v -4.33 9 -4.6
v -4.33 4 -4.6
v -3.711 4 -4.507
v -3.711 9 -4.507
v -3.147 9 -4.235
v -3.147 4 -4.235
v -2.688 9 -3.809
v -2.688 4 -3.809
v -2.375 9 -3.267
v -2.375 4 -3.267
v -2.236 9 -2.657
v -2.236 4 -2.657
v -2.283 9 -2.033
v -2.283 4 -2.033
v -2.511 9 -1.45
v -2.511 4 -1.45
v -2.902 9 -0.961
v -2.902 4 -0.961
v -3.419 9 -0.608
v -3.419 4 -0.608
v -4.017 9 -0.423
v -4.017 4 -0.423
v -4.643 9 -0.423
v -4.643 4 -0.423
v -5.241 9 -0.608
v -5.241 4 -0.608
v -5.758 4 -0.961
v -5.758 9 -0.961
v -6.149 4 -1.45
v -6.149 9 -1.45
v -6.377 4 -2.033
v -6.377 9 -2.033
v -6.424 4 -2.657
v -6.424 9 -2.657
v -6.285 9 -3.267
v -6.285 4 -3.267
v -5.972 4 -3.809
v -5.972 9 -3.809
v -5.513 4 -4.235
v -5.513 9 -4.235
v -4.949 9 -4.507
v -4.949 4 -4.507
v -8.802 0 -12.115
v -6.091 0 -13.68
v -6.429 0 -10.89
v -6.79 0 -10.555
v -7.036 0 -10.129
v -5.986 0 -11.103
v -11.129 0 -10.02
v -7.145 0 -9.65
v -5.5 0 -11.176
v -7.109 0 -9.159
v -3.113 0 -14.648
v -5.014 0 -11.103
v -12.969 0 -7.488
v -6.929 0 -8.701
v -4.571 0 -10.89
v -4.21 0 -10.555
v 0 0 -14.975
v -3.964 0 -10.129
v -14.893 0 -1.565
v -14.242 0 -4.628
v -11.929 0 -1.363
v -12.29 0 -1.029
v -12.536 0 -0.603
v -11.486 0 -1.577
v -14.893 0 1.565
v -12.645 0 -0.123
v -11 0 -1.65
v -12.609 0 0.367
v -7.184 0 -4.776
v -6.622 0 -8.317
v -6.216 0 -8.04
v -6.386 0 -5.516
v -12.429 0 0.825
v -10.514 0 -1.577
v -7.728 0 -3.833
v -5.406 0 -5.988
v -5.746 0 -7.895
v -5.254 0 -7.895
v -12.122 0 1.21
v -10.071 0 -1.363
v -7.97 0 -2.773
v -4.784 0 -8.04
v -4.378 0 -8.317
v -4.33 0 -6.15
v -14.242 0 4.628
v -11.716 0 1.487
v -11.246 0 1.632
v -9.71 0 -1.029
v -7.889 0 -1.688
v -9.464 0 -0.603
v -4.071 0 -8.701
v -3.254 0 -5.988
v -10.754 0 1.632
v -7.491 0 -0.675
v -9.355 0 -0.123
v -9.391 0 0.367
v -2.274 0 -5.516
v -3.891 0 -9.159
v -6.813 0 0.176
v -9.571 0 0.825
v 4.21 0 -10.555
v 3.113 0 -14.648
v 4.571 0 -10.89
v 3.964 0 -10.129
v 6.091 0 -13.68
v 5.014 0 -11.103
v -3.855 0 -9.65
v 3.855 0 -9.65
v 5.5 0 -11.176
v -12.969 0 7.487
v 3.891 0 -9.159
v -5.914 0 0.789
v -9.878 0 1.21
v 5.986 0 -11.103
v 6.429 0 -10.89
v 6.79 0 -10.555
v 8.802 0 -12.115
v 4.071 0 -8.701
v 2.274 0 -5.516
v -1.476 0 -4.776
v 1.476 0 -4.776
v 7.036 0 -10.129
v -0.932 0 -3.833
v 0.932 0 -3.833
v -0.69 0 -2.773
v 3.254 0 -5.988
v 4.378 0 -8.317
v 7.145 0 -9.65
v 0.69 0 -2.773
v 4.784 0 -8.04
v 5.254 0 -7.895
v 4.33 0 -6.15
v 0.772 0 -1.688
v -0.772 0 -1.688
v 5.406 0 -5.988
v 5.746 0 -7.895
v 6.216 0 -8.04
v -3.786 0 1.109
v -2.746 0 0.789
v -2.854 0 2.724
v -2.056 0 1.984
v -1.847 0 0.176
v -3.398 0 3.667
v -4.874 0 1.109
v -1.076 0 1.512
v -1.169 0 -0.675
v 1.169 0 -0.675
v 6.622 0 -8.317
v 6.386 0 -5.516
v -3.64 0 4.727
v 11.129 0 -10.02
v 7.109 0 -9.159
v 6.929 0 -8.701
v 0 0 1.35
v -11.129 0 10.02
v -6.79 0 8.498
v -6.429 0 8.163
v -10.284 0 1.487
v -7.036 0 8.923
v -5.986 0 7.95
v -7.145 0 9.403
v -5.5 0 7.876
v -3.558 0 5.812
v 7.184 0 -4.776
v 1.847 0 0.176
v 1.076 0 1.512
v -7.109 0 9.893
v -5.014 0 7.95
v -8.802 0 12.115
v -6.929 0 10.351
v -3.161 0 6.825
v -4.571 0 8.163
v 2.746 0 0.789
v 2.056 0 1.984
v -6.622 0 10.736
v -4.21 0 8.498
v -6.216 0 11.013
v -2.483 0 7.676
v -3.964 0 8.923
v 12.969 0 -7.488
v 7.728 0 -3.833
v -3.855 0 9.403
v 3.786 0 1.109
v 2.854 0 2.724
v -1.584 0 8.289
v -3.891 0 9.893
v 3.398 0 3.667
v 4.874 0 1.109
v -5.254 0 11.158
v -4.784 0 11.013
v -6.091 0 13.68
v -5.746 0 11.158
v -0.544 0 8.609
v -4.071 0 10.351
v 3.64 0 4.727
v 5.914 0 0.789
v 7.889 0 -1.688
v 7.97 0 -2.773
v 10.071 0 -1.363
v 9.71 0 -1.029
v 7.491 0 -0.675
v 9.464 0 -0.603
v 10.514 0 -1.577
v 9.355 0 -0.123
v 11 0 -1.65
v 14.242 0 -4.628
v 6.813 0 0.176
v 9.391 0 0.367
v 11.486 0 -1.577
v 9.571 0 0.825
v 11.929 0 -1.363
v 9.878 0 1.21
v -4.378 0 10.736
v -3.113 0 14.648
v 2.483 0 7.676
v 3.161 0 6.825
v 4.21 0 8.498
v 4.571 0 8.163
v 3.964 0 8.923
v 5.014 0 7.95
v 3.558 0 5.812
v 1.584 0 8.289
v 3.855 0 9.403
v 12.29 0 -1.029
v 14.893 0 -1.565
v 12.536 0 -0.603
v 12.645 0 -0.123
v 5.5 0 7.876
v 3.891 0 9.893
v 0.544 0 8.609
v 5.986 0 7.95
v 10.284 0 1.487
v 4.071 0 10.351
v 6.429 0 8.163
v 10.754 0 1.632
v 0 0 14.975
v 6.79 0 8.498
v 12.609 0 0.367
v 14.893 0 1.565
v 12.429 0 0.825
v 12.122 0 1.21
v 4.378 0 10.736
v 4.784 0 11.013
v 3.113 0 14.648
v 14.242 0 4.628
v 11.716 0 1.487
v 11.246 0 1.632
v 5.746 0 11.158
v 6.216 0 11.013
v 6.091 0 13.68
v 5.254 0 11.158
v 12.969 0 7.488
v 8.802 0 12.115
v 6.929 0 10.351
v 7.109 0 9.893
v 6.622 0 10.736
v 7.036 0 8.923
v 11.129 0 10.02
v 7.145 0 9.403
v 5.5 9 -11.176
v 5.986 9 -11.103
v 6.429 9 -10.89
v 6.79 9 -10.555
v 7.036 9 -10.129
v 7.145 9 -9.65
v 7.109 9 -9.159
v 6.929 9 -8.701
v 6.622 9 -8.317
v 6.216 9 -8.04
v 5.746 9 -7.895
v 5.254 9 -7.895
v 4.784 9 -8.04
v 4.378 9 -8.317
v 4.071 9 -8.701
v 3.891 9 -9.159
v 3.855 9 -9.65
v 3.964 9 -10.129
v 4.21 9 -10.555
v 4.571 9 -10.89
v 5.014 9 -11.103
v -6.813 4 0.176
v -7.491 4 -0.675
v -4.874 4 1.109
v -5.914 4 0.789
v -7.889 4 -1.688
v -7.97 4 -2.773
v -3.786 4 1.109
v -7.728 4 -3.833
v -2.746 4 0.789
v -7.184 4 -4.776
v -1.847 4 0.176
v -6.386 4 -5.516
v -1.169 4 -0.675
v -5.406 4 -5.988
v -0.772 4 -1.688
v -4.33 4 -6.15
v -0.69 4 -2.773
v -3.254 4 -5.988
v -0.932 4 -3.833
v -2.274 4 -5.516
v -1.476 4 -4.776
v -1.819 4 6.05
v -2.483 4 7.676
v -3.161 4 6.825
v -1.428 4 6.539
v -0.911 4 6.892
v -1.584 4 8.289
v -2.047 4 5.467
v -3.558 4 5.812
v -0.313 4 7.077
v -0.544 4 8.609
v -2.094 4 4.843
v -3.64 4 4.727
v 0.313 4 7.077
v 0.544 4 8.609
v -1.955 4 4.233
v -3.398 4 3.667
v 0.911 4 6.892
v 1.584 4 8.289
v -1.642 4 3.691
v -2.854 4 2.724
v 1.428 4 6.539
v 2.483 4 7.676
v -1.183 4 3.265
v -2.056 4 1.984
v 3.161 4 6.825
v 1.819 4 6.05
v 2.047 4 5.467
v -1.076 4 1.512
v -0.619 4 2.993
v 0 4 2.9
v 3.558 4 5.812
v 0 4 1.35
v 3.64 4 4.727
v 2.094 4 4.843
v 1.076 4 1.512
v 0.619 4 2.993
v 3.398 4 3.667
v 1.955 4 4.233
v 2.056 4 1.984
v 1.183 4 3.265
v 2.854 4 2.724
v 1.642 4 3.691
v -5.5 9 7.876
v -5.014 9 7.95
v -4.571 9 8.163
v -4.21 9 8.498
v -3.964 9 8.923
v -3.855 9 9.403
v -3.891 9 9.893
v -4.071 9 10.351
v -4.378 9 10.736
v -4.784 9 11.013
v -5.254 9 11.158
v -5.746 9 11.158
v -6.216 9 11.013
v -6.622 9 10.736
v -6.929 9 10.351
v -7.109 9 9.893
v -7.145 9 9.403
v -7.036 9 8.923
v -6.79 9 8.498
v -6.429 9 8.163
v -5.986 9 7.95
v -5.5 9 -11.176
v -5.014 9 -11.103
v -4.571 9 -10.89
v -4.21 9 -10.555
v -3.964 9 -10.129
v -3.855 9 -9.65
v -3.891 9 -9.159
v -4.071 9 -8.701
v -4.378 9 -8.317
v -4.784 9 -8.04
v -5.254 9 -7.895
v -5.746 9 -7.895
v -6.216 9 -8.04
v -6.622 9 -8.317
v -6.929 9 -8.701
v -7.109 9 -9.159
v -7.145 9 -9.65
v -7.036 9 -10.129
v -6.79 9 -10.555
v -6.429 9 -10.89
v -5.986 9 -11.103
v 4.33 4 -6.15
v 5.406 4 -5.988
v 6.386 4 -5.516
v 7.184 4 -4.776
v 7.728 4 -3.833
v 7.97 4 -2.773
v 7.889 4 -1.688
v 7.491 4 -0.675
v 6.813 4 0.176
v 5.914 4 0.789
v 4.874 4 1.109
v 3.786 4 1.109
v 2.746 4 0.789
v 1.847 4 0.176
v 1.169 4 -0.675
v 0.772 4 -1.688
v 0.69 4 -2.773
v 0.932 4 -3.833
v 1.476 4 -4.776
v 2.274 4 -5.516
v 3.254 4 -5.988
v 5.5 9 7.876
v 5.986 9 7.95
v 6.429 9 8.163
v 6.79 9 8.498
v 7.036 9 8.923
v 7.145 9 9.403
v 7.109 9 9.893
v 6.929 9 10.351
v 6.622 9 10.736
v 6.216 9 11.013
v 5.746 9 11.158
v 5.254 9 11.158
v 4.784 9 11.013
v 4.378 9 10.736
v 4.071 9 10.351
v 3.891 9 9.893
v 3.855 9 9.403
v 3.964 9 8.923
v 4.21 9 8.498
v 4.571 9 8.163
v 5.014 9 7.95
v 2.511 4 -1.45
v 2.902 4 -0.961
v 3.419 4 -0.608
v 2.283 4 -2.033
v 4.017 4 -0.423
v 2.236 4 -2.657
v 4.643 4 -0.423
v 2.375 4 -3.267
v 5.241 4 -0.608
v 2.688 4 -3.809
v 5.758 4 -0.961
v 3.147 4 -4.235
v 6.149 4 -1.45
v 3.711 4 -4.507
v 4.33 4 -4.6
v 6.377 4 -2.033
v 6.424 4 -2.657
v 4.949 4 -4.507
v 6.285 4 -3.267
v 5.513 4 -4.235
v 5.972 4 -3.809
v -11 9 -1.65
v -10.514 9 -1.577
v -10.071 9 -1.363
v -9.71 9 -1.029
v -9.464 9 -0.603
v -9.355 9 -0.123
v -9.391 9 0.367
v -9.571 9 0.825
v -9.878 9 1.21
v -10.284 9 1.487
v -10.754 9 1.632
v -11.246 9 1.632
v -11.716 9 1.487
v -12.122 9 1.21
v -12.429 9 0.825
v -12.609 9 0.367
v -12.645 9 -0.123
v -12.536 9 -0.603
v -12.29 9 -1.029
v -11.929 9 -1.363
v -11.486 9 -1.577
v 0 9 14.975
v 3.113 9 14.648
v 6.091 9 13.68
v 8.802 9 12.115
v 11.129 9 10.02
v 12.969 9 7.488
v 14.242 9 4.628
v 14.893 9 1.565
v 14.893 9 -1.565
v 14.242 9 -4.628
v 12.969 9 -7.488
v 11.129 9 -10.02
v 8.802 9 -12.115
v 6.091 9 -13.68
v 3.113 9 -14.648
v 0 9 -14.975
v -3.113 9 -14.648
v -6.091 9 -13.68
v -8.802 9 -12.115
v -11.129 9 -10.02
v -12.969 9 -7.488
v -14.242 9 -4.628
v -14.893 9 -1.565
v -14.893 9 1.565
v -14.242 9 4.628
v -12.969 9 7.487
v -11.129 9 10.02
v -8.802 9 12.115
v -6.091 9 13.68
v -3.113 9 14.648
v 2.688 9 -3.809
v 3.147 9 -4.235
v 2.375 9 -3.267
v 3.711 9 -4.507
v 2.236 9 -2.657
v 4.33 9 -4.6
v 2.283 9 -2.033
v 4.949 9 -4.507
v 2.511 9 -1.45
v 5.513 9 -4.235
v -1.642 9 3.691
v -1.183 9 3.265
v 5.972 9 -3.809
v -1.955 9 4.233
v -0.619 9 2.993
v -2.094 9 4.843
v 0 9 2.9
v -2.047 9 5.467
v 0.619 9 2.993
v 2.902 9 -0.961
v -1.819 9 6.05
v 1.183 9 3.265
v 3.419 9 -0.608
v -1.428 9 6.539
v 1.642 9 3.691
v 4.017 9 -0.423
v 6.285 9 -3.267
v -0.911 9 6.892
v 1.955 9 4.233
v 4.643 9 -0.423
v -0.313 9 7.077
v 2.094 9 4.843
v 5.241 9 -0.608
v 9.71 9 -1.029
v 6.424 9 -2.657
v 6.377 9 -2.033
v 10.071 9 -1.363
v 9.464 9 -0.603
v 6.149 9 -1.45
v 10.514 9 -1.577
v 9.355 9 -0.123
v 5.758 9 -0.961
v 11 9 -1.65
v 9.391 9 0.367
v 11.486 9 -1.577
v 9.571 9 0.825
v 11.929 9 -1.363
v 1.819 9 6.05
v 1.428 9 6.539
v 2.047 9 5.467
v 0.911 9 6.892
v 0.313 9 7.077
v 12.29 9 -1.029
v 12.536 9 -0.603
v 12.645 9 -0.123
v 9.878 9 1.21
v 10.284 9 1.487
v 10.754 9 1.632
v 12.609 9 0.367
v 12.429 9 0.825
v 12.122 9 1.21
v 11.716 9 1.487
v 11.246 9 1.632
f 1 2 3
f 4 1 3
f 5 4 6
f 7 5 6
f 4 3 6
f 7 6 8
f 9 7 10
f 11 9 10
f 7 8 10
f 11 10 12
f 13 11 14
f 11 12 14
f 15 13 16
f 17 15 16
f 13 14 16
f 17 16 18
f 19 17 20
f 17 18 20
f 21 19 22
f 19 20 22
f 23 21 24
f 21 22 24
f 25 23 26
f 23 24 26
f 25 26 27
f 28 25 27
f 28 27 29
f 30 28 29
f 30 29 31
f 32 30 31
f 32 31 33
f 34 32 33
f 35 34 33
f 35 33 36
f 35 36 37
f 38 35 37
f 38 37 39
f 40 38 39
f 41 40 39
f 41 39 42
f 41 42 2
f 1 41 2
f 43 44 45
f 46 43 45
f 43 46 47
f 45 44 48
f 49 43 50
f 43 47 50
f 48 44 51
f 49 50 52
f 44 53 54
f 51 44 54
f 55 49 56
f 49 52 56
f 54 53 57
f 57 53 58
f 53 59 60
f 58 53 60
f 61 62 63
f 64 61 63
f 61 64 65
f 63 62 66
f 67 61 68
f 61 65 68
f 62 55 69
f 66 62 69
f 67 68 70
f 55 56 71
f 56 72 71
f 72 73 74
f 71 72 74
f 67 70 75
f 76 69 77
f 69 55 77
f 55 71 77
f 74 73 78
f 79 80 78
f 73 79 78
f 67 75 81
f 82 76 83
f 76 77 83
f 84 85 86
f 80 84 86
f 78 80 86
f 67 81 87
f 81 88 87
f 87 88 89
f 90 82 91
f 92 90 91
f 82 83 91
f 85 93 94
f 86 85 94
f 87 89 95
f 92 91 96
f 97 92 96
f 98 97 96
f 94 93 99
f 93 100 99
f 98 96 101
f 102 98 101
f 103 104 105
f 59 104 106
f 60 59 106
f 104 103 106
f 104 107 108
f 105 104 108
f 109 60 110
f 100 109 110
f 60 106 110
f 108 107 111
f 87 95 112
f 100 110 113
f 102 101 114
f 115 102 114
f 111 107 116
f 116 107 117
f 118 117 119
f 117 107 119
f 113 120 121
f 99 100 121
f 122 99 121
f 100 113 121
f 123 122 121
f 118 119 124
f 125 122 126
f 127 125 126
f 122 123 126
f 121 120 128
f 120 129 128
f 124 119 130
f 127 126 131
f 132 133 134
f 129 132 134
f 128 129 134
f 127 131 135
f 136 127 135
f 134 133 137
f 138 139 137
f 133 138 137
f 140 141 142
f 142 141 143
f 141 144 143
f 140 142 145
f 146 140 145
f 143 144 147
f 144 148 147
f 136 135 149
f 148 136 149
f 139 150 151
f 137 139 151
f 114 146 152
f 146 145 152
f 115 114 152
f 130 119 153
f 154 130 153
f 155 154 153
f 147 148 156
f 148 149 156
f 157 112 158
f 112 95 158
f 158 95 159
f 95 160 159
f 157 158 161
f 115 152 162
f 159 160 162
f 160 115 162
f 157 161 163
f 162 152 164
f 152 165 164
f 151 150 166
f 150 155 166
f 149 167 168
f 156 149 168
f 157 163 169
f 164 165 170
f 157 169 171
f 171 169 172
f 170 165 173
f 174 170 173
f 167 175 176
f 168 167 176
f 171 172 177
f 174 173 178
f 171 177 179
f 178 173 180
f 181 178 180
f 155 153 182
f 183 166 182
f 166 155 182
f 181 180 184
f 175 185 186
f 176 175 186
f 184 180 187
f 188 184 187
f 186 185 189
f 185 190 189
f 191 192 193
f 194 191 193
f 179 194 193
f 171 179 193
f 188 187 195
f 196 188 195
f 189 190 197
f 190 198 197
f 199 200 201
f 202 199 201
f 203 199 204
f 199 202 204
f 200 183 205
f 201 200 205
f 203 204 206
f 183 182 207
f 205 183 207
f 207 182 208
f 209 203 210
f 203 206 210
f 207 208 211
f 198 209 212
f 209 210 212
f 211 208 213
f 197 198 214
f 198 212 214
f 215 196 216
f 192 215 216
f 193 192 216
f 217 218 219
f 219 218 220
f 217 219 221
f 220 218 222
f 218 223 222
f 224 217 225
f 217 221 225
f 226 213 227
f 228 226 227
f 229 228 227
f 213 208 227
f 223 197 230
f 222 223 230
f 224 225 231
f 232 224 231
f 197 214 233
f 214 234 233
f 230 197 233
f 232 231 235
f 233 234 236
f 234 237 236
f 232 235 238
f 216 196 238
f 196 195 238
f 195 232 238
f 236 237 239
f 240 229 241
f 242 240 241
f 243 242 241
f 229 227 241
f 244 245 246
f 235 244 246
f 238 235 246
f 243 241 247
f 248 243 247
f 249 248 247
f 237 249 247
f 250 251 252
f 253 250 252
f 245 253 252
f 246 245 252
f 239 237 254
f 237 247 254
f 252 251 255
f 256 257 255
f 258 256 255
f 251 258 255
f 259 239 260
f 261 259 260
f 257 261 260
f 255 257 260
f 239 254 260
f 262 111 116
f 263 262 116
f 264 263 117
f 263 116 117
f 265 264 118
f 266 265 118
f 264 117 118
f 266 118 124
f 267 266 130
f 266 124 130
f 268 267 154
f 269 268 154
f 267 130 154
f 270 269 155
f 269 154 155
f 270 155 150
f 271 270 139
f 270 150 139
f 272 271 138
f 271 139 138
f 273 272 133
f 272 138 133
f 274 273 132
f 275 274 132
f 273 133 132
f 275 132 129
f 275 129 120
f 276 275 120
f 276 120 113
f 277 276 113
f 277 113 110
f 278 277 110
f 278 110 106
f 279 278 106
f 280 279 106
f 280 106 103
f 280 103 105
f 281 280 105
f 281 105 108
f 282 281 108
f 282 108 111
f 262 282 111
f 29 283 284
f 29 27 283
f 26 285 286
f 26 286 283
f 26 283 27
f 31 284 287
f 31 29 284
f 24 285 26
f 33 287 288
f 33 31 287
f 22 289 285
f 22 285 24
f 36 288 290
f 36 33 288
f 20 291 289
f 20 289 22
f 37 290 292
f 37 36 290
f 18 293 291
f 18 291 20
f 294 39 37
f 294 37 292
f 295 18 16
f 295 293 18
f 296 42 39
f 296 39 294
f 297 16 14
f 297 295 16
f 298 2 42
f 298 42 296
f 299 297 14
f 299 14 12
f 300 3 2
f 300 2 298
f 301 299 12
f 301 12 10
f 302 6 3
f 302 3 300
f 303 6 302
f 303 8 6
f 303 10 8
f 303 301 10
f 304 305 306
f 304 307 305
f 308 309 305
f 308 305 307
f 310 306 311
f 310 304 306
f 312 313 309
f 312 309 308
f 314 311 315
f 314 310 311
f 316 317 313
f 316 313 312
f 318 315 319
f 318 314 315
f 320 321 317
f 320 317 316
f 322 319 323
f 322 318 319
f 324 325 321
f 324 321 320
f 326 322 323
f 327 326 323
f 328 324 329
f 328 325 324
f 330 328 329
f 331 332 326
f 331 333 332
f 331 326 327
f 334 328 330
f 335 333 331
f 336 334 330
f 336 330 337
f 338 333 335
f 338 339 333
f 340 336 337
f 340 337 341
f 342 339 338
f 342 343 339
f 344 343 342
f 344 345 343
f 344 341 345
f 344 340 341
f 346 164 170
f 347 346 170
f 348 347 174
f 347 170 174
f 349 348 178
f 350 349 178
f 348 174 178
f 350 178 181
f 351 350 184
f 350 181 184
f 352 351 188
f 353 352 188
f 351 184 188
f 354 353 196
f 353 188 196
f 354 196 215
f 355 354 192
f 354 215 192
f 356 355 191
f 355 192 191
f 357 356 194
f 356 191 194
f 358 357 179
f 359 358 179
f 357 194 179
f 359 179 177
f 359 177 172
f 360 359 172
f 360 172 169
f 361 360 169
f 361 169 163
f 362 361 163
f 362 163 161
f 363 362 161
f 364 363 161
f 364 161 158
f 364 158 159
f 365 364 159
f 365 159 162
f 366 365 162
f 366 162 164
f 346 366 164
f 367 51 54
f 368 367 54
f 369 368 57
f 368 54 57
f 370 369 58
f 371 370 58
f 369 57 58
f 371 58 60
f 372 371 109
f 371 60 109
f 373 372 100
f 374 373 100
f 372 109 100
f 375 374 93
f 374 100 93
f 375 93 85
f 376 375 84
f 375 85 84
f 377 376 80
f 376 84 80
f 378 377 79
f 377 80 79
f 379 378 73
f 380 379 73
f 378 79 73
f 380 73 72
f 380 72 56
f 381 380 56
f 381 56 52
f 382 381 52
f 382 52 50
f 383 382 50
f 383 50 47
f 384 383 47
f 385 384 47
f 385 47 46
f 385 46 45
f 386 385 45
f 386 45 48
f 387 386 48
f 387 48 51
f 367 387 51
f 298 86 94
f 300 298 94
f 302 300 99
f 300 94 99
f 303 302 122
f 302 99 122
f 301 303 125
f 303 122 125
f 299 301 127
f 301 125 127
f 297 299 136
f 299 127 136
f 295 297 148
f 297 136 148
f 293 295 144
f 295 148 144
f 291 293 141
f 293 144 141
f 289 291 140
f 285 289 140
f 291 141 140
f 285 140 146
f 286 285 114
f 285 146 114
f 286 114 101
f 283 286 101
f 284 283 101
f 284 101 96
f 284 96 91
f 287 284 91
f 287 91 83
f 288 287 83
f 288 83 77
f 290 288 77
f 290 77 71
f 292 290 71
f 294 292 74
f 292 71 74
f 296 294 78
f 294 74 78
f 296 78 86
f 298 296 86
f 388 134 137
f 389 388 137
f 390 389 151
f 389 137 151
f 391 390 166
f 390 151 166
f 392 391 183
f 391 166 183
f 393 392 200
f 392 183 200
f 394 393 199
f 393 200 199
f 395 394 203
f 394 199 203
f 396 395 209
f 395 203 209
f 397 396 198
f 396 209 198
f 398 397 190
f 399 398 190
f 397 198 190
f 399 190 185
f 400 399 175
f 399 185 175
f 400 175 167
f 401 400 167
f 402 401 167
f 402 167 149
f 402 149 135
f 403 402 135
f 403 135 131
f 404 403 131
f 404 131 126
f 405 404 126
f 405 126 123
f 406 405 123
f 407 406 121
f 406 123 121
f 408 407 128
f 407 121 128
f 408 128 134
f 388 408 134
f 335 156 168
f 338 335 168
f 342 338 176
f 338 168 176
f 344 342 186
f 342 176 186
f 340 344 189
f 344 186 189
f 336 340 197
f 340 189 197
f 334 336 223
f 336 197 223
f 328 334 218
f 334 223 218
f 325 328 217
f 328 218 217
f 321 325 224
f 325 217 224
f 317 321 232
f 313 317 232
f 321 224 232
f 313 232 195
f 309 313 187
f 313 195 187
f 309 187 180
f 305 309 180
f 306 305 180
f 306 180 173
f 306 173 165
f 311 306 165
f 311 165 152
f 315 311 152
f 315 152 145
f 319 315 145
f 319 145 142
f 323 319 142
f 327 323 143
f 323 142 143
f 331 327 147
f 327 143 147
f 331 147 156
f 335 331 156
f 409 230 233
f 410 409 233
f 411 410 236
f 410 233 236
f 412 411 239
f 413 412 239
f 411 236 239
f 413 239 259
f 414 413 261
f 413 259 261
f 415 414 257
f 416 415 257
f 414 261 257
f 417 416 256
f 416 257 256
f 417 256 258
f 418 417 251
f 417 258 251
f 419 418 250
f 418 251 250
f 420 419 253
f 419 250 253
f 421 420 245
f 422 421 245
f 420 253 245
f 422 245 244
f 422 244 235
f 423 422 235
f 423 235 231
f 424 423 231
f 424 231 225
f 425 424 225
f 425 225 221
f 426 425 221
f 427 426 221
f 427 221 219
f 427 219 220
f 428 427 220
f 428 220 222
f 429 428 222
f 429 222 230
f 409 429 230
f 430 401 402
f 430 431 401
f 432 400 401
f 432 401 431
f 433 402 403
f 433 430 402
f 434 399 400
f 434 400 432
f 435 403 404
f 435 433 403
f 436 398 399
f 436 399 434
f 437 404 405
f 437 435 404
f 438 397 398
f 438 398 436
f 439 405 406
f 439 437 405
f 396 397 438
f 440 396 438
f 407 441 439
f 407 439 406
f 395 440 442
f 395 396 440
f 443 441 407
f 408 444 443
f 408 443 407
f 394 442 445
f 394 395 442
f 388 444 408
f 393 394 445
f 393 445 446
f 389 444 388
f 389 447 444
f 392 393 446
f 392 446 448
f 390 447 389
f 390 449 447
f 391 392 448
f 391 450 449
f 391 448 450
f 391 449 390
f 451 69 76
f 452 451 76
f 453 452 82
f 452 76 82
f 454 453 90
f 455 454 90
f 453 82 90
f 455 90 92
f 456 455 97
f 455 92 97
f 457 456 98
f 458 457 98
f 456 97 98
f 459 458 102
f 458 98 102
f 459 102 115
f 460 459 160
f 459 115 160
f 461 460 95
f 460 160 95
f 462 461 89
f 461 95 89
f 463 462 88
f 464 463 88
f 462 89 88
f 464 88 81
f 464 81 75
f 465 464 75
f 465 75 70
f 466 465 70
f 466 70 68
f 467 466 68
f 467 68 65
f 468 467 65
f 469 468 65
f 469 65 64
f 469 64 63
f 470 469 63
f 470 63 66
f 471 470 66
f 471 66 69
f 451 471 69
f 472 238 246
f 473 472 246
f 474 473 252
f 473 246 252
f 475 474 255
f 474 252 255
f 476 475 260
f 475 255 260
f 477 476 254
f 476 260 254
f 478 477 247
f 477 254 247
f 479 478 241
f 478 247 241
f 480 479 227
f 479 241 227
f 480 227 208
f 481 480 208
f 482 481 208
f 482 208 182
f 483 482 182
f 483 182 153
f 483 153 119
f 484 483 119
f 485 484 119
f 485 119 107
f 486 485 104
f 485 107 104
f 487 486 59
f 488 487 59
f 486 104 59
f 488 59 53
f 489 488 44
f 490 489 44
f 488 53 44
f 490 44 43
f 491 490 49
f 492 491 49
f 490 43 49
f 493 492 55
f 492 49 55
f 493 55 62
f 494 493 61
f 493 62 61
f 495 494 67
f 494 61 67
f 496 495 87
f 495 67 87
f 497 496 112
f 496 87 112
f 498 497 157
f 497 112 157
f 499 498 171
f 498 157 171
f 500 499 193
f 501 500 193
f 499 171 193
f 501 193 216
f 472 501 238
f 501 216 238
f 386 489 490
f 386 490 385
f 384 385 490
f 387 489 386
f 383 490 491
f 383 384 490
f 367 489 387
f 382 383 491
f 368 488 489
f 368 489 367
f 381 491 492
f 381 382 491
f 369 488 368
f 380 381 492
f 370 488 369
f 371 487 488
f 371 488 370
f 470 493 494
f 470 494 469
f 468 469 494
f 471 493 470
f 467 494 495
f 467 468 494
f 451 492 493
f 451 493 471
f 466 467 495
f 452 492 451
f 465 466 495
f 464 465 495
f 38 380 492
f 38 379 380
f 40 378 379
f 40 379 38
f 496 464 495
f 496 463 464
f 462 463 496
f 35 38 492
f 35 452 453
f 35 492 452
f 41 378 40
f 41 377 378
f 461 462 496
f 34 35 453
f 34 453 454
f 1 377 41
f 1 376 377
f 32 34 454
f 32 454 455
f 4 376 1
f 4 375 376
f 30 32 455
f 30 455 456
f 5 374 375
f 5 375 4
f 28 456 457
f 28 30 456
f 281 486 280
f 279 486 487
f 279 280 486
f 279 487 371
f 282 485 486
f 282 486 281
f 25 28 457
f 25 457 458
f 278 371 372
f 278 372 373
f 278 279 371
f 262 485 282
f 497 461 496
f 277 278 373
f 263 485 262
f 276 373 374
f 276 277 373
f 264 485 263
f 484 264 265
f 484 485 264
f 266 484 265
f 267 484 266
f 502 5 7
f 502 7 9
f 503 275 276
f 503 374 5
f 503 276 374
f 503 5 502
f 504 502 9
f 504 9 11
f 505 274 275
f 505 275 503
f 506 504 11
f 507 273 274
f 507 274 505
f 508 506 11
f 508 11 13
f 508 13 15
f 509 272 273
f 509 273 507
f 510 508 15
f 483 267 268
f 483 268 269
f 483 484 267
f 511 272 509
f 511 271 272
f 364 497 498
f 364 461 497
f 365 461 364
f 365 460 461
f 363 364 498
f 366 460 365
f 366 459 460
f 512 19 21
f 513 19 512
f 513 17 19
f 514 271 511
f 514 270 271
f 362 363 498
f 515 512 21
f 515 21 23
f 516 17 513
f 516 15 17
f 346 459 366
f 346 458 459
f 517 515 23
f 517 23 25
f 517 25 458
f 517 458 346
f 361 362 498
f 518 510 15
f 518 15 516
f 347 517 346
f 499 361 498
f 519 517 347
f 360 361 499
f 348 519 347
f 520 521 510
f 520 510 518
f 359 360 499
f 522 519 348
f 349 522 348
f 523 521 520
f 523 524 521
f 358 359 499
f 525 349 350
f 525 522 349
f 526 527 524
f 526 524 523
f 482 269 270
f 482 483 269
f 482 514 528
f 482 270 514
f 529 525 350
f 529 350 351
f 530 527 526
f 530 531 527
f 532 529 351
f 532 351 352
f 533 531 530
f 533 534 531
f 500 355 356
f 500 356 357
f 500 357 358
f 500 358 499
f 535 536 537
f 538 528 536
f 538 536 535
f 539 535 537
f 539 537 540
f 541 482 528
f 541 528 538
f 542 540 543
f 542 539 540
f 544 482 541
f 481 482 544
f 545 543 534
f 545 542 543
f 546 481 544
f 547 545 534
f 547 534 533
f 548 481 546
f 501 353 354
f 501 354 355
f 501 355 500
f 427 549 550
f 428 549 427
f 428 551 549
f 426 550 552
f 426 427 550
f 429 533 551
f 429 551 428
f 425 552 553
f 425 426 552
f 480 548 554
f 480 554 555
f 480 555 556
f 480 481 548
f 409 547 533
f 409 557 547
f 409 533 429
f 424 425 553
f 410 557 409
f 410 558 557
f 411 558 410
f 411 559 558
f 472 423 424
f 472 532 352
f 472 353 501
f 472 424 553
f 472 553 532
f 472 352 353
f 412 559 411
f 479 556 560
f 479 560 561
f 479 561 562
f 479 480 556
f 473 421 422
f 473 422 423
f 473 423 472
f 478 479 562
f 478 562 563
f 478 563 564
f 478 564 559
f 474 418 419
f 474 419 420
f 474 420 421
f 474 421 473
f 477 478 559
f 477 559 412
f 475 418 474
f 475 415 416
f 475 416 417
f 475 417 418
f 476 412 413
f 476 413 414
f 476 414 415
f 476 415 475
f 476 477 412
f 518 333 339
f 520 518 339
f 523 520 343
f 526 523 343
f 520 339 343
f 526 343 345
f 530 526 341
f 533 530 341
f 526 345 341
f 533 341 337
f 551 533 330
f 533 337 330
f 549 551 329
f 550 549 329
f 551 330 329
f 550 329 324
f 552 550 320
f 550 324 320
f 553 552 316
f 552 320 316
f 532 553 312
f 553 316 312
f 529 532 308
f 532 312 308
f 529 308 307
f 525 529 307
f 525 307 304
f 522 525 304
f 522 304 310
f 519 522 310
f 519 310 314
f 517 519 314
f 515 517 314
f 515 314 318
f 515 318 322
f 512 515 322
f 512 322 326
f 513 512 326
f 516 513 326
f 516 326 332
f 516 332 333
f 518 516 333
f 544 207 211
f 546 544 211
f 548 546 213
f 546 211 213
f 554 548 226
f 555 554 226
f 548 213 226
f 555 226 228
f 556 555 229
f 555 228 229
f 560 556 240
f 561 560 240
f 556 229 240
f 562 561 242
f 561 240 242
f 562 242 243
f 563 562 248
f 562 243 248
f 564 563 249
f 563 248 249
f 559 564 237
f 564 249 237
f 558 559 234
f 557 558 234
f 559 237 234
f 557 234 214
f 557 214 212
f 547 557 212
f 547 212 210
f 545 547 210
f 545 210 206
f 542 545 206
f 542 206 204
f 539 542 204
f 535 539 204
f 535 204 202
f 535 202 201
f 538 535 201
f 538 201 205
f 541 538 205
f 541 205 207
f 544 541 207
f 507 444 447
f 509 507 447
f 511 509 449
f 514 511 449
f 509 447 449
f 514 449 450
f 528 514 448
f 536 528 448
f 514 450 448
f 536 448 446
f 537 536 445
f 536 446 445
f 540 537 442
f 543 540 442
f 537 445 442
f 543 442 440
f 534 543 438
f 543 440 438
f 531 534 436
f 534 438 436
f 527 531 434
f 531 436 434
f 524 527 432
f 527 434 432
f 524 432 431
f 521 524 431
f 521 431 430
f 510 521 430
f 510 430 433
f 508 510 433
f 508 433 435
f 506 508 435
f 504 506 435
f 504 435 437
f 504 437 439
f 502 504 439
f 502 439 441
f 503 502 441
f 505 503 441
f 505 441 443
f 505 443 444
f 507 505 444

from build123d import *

# Parameters (mm, degrees)
SKETCH_1_R          = 14.975
EXTRUDE_1_DEPTH     = 9
SKETCH_2_R          = 1.65
CUT_EXTRUDE_1_DEPTH = 10
SKETCH_3_R          = 2.1
CUT_EXTRUDE_2_DEPTH = 24.010894159
SKETCH_4_R          = 3.65
CUT_EXTRUDE_3_DEPTH = 4


with BuildPart() as part:
    # 草图1 → 凸台-拉伸1 (new body)
    with BuildSketch(Plane(origin=(0, 0, 0), x_dir=(1, 0, 0), z_dir=(0, 1, 0))):
        with Locations(Location((0, 0, 0), (0, 0, 270))):
            Circle(SKETCH_1_R)
    extrude(amount=EXTRUDE_1_DEPTH)

    # 草图2 → 切除-拉伸1 (cut)
    with BuildSketch(Plane.XZ):
        with Locations(Location((-11, 0, 0), (0, 0, 270))):
            Circle(SKETCH_2_R)
        with Locations(Location((-5.5, 9.526279442, 0), (0, 0, 270))):
            Circle(SKETCH_2_R)
        with Locations(Location((5.5, 9.526279442, 0), (0, 0, 270))):
            Circle(SKETCH_2_R)
        with Locations(Location((11, 0, 0), (0, 0, 270))):
            Circle(SKETCH_2_R)
        with Locations(Location((5.5, -9.526279442, 0), (0, 0, 270))):
            Circle(SKETCH_2_R)
        with Locations(Location((-5.5, -9.526279442, 0), (0, 0, 270))):
            Circle(SKETCH_2_R)
    extrude(amount=-CUT_EXTRUDE_1_DEPTH, mode=Mode.SUBTRACT)

    # 草图3 → 切除-拉伸2 (cut, through all)
    with BuildSketch(Plane.XZ):
        with Locations(Location((0, 5, 0), (0, 0, 270))):
            Circle(SKETCH_3_R)
        with Locations(Location((4.330127019, -2.5, 0), (0, 0, 270))):
            Circle(SKETCH_3_R)
        with Locations(Location((-4.330127019, -2.5, 0), (0, 0, 270))):
            Circle(SKETCH_3_R)
    extrude(amount=-CUT_EXTRUDE_2_DEPTH, mode=Mode.SUBTRACT)

    # 草图4 → 切除-拉伸3 (cut)
    with BuildSketch(Plane.XZ):
        with Locations(Location((0, 5, 0), (0, 0, 270))):
            Circle(SKETCH_4_R)
        with Locations(Location((-4.330127019, -2.5, 0), (0, 0, 270))):
            Circle(SKETCH_4_R)
        with Locations(Location((4.330127019, -2.5, 0), (0, 0, 270))):
            Circle(SKETCH_4_R)
    extrude(amount=-CUT_EXTRUDE_3_DEPTH, mode=Mode.SUBTRACT)


solid = part.part
